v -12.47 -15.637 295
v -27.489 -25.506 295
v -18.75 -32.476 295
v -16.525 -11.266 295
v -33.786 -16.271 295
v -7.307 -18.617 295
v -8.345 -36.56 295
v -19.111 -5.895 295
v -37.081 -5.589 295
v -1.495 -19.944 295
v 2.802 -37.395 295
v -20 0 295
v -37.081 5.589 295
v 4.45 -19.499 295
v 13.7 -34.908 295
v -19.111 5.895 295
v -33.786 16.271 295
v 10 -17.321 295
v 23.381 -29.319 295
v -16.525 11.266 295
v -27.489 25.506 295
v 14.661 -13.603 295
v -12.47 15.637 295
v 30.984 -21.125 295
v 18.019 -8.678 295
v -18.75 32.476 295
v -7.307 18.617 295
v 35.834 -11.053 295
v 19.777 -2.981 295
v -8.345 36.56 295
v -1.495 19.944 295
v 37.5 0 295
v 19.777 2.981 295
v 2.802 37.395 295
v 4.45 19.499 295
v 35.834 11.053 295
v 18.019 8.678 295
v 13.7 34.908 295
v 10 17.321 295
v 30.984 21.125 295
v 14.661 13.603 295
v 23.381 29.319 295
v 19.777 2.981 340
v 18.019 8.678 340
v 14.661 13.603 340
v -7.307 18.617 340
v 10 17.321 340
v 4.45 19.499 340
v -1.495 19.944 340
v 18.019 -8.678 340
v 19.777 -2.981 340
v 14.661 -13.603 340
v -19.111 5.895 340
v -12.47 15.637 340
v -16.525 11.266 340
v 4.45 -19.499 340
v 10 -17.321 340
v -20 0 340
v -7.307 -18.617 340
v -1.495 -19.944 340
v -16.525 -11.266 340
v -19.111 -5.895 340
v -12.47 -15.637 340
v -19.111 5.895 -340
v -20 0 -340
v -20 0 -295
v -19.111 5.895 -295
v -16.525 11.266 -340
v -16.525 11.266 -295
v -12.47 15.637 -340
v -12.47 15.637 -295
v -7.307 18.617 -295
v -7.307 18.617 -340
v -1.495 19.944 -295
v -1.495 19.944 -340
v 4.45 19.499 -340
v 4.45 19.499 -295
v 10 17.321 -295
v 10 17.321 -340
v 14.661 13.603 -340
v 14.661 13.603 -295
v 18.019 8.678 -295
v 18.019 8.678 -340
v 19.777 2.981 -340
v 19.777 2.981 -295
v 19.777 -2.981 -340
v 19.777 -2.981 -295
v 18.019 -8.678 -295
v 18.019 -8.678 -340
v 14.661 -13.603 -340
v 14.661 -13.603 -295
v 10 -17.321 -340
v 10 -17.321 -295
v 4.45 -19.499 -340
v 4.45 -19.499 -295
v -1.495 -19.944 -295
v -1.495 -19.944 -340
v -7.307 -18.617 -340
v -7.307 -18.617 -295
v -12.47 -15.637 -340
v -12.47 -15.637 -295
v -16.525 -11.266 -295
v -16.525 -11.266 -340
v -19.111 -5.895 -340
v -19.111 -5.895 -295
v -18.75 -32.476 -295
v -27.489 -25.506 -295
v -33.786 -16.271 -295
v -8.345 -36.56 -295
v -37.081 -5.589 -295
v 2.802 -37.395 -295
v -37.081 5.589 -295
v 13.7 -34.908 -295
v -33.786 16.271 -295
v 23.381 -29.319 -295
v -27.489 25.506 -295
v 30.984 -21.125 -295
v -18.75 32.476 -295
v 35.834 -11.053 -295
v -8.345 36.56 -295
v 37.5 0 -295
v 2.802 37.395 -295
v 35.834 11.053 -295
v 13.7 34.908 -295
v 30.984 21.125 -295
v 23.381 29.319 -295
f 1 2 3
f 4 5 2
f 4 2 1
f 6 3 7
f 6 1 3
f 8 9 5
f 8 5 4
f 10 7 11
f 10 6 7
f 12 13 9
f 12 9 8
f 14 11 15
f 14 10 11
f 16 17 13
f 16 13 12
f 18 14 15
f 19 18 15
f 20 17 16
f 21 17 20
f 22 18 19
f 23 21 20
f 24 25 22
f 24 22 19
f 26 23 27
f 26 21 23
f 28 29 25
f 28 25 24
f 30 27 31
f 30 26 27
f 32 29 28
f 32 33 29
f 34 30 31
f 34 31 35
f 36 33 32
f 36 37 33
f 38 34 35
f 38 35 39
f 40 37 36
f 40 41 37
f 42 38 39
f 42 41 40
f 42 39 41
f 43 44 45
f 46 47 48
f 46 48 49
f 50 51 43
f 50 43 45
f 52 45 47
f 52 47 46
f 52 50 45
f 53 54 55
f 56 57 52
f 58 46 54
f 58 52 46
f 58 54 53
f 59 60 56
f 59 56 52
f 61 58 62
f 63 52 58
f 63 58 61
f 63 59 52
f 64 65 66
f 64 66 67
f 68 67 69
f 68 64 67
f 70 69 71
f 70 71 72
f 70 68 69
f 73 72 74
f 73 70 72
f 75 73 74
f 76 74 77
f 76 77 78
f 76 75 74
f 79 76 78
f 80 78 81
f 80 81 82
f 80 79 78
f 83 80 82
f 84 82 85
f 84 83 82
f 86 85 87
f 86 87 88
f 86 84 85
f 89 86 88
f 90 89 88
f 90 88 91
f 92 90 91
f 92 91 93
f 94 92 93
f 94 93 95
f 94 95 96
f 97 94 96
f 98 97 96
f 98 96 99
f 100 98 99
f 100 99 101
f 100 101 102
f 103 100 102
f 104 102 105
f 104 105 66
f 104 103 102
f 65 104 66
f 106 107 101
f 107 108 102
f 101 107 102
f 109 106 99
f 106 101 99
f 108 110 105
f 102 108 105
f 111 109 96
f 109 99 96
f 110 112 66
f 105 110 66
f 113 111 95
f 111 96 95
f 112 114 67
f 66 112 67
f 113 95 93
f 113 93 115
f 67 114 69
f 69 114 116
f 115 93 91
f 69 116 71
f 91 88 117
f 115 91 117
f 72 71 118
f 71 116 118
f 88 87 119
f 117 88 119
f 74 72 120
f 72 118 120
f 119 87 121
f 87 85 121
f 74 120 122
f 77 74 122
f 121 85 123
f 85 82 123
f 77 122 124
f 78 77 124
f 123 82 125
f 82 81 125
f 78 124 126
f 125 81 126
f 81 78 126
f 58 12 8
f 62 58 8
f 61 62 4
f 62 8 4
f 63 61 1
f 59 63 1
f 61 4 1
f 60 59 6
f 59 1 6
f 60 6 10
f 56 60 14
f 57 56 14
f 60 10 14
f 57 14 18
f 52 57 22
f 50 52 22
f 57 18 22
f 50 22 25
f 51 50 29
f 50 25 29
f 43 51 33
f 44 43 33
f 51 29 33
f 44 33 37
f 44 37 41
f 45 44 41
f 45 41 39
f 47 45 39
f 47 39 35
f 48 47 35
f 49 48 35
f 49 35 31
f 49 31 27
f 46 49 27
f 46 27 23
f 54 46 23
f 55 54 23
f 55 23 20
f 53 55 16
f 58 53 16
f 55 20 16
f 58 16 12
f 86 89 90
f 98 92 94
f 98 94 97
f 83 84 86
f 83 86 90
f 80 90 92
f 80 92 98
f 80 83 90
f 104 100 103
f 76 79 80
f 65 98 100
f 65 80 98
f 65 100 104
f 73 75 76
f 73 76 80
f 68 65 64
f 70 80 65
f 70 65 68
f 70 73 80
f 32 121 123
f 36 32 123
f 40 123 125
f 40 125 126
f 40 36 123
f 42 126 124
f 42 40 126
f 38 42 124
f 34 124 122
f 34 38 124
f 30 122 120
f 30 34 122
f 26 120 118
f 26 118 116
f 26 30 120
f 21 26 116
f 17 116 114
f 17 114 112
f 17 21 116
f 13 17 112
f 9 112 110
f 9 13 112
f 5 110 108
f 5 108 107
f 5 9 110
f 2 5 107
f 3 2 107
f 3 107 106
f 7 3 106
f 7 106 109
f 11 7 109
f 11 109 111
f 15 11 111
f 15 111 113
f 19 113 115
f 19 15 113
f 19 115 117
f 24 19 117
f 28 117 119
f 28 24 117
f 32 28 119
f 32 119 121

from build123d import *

# Parameters (mm, degrees)
SKETCH1_R           = 37.5
BOSS_EXTRUDE1_DEPTH = 295
SKETCH2_R           = 20
BOSS_EXTRUDE2_DEPTH = 45
BOSS_EXTRUDE3_START = 45
SKETCH3_R           = 20
BOSS_EXTRUDE3_DEPTH = 45


with BuildPart() as part:
    # Sketch1 → Boss-Extrude1 (new, symmetric)
    with BuildSketch(Plane.XY):
        Circle(SKETCH1_R)
    extrude(amount=BOSS_EXTRUDE1_DEPTH, both=True)

    # Sketch2 → Boss-Extrude2 (add)
    with BuildSketch(Plane.XY.offset(295)):
        with Locations(Location((0, 0, 0), (0, 0, 180))):
            Circle(SKETCH2_R)
    extrude(amount=BOSS_EXTRUDE2_DEPTH)

    # Sketch3 → Boss-Extrude3 (add)
    with BuildSketch(Plane(origin=(0, 0, -295), x_dir=(-1, 0, 0), z_dir=(0, 0, -1)).offset(BOSS_EXTRUDE3_START)):
        Circle(SKETCH3_R)
    extrude(amount=-BOSS_EXTRUDE3_DEPTH)


solid = part.part
